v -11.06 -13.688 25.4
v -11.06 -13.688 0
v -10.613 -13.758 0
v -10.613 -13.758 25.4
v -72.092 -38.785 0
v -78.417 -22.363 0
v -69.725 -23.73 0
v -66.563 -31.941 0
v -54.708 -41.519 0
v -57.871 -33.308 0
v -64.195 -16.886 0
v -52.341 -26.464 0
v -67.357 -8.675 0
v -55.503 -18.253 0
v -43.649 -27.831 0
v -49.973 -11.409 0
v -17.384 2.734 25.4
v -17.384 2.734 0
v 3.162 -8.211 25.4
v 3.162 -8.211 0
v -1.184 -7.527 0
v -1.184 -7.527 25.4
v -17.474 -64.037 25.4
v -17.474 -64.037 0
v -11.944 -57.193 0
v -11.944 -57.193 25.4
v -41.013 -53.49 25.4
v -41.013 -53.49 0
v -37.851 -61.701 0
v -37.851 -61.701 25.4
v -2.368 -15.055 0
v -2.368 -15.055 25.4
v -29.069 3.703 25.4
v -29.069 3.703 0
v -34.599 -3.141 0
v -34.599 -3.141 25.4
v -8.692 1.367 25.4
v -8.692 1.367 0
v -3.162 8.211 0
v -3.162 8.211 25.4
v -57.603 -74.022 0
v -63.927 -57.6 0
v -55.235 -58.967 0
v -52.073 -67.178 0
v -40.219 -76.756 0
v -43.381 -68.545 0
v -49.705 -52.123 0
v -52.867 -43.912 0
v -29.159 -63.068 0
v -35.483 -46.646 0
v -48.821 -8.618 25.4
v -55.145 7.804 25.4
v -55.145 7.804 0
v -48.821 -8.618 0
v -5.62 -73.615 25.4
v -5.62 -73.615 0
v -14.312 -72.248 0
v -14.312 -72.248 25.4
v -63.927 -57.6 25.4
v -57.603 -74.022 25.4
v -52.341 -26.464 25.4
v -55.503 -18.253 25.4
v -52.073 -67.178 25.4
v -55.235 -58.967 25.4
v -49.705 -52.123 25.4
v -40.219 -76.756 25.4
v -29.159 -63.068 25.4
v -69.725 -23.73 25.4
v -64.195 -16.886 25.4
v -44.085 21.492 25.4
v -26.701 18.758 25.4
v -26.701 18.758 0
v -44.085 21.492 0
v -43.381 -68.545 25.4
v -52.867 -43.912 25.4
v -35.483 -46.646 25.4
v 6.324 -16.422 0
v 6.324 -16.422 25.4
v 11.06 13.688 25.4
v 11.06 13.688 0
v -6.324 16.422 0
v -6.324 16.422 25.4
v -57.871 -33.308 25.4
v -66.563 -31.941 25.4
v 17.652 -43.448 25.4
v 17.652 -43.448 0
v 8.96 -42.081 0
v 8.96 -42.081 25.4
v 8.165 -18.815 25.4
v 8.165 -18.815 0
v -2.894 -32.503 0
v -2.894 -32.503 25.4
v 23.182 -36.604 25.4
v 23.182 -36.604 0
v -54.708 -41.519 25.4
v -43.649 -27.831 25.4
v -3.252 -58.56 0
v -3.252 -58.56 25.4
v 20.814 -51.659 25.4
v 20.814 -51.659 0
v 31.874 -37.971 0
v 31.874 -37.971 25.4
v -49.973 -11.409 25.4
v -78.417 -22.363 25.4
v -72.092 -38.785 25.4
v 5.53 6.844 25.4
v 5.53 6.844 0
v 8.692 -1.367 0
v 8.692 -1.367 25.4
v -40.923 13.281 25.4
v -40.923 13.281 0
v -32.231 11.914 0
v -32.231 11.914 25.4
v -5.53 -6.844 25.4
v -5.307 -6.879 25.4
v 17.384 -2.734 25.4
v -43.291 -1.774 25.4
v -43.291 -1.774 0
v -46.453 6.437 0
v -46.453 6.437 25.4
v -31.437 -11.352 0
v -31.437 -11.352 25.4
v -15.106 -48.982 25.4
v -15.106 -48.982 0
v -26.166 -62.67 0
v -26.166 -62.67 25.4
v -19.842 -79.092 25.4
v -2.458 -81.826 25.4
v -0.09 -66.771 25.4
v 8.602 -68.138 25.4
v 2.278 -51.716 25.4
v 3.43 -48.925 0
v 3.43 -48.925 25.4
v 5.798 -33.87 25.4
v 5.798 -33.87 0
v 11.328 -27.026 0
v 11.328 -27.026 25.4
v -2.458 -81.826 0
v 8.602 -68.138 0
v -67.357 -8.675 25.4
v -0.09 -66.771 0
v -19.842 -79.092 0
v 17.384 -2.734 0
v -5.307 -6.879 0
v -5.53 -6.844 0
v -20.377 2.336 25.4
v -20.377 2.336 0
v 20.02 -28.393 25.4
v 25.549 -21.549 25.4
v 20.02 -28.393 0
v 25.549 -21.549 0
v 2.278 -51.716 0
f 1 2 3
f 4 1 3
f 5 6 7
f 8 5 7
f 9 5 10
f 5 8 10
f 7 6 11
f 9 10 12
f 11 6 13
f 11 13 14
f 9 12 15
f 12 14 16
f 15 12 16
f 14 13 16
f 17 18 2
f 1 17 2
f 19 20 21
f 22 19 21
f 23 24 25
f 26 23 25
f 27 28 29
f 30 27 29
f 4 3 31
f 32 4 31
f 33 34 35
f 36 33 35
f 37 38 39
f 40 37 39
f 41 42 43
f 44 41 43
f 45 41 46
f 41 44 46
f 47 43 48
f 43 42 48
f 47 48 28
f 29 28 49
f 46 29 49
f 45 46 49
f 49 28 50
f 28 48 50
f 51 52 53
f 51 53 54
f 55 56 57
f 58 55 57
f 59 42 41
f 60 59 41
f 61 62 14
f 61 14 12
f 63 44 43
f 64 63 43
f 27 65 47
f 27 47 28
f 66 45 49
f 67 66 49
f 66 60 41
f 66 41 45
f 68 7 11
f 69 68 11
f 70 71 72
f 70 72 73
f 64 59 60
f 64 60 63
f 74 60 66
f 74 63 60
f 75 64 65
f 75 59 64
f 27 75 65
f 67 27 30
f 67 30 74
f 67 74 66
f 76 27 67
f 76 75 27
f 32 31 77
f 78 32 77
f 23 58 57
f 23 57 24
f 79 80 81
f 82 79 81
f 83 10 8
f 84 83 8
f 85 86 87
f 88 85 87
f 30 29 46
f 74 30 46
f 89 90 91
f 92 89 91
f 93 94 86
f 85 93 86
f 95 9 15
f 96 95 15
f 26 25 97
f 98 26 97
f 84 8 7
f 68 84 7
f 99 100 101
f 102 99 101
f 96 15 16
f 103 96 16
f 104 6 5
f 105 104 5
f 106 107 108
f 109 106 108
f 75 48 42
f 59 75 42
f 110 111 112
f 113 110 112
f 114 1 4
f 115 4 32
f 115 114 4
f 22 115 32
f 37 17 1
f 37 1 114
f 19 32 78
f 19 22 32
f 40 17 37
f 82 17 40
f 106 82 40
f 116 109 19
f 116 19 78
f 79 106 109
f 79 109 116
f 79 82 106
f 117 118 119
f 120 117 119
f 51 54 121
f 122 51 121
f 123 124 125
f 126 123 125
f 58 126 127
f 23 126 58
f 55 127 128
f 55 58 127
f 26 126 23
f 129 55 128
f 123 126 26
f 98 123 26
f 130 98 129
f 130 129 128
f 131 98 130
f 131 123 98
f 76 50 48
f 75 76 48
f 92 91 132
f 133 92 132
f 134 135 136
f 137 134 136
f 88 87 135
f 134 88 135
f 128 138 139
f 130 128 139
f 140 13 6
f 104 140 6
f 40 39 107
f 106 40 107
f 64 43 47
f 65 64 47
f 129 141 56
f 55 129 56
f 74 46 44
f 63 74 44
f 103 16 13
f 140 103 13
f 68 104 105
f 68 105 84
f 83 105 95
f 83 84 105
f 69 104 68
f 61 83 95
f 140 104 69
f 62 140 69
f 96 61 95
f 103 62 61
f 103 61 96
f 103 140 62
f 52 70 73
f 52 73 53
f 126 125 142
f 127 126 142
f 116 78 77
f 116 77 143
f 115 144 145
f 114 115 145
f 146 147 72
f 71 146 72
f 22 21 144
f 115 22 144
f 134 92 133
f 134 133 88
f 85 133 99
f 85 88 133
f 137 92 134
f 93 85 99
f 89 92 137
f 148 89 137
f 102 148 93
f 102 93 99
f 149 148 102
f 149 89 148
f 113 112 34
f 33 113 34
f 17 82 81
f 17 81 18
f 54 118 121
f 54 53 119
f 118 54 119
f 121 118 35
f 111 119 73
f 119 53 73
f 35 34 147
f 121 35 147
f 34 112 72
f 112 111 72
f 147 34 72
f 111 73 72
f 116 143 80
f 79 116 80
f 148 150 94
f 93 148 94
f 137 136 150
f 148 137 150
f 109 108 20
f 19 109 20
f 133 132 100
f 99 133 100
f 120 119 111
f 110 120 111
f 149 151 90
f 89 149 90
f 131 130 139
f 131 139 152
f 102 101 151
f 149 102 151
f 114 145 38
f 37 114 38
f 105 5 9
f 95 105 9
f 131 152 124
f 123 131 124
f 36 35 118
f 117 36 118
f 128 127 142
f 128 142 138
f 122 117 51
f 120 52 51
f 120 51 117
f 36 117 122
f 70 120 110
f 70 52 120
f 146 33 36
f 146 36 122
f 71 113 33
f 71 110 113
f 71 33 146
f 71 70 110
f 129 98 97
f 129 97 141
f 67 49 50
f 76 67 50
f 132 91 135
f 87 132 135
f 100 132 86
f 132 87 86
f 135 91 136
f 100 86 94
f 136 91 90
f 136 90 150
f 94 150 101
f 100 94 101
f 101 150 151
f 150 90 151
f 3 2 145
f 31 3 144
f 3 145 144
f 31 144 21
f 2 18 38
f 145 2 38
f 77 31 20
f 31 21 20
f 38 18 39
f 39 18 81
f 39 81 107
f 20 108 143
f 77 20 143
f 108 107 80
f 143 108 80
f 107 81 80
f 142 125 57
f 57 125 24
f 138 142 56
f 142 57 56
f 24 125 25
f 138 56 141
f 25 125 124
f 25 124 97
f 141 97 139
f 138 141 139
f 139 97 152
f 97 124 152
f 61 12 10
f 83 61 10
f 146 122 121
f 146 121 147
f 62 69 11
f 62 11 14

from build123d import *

# Parameters (mm, degrees)
F1_DEPTH = 25.4


with BuildPart() as f1:
    # F0 (on Top) → F1 (new body)
    with BuildSketch(Plane.XY):
        Polygon((-72.0923932347, -38.7846963805), (-54.7084513345, -41.518807573), (-43.648670635, -27.8309278658), (-49.9728318356, -11.4089369661), (-67.3567737358, -8.6748257736), (-78.4165544353, -22.3627054808), align=None)
        Polygon((-55.5027221854, -18.2528768197), (-52.3406415851, -26.4638722695), (-57.8705319349, -33.3078121231), (-66.5625028849, -31.9407565269), (-69.7245834852, -23.7297610771), (-64.1946931355, -16.8858212235), align=None, mode=Mode.SUBTRACT)
    extrude(amount=F1_DEPTH)


with BuildPart() as f1b:
    # F0 (on Top) → F1, piece 2 (new body)
    with BuildSketch(Plane.XY):
        Polygon((-55.1450750988, 7.8043004941), (-48.8209138982, -8.6176904056), (-31.436971998, -11.3518015981), (-20.3771912985, 2.3360781091), (-26.7013524991, 18.7580690088), (-44.0852943993, 21.4921802013), align=None)
        Polygon((-29.0691622486, 3.7031337054), (-34.5990525983, -3.1408061482), (-43.2910235484, -1.773750552), (-46.4531041487, 6.4372448978), (-40.9232137989, 13.2811847514), (-32.2312428489, 11.9141291552), align=None, mode=Mode.SUBTRACT)
    extrude(amount=F1_DEPTH)


with BuildPart() as f1c:
    # F0 (on Top) → F1, piece 3 (new body)
    with BuildSketch(Plane.XY):
        Polygon((-5.3066483048, -6.8790509105), (-10.6132966097, -13.758101821), (-2.3678097495, -15.0549353034), (-1.1839048747, -7.5274676517), align=None)
        Polygon((-6.3241612006, 16.4219908997), (-17.3839419001, 2.7341111925), (-11.0597806995, -13.6878797072), (-10.6132966097, -13.758101821), (-5.3066483048, -6.8790509105), (-5.5298903498, -6.8439398536), (-8.6919709501, 1.3670555962), (-3.1620806003, 8.2109954498), (5.5298903498, 6.8439398536), (8.6919709501, -1.3670555962), (3.1620806003, -8.2109954498), (-1.1839048747, -7.5274676517), (-2.3678097495, -15.0549353034), (6.3241612006, -16.4219908997), (17.3839419001, -2.7341111925), (11.0597806995, 13.6878797072), align=None)
    extrude(amount=F1_DEPTH)


with BuildPart() as f1d:
    # F0 (on Top) → F1, piece 4 (new body)
    with BuildSketch(Plane.XY):
        Polygon((25.5494345617, -21.5493155693), (8.1654926615, -18.8152043769), (-2.894288038, -32.503084084), (3.4298731626, -48.9250749837), (20.8138150627, -51.6591861762), (31.8735957623, -37.971306469), align=None)
        Polygon((8.9597635124, -42.0811351301), (5.7976829121, -33.8701396803), (11.3275732618, -27.0261998267), (20.0195442119, -28.3932554229), (23.1816248122, -36.6042508728), (17.6517344624, -43.4481907264), align=None, mode=Mode.SUBTRACT)
    extrude(amount=F1_DEPTH)


with BuildPart() as f1e:
    # F0 (on Top) → F1, piece 5 (new body)
    with BuildSketch(Plane.XY):
        Polygon((8.6021164258, -68.1383124439), (2.2779552252, -51.7163215442), (-15.105986675, -48.9822103518), (-26.1657673745, -62.670090059), (-19.8416061739, -79.0920809586), (-2.4576642738, -81.8261921511), align=None)
        Polygon((-17.4737964244, -64.0371456552), (-11.9439060747, -57.1932058016), (-3.2519351246, -58.5602613978), (-0.0898545243, -66.7712568477), (-5.6197448741, -73.6151967013), (-14.3117158241, -72.248141105), align=None, mode=Mode.SUBTRACT)
    extrude(amount=F1_DEPTH)


with BuildPart() as f1f:
    # F0 (on Top) → F1, piece 6 (new body)
    with BuildSketch(Plane.XY):
        Polygon((-40.2187974724, -76.7560028495), (-29.1590167729, -63.0681231423), (-35.4831779735, -46.6461322426), (-52.8671198736, -43.9120210502), (-63.9269005732, -57.5999007573), (-57.6027393725, -74.021891657), align=None)
        Polygon((-49.7050392733, -52.1230165), (-41.0130683233, -53.4900720962), (-37.850987723, -61.7010675461), (-43.3808780727, -68.5450073997), (-52.0728490228, -67.1779518034), (-55.2349296231, -58.9669563536), align=None, mode=Mode.SUBTRACT)
    extrude(amount=F1_DEPTH)


solid = Compound([f1.part, f1b.part, f1c.part, f1d.part, f1e.part, f1f.part])
